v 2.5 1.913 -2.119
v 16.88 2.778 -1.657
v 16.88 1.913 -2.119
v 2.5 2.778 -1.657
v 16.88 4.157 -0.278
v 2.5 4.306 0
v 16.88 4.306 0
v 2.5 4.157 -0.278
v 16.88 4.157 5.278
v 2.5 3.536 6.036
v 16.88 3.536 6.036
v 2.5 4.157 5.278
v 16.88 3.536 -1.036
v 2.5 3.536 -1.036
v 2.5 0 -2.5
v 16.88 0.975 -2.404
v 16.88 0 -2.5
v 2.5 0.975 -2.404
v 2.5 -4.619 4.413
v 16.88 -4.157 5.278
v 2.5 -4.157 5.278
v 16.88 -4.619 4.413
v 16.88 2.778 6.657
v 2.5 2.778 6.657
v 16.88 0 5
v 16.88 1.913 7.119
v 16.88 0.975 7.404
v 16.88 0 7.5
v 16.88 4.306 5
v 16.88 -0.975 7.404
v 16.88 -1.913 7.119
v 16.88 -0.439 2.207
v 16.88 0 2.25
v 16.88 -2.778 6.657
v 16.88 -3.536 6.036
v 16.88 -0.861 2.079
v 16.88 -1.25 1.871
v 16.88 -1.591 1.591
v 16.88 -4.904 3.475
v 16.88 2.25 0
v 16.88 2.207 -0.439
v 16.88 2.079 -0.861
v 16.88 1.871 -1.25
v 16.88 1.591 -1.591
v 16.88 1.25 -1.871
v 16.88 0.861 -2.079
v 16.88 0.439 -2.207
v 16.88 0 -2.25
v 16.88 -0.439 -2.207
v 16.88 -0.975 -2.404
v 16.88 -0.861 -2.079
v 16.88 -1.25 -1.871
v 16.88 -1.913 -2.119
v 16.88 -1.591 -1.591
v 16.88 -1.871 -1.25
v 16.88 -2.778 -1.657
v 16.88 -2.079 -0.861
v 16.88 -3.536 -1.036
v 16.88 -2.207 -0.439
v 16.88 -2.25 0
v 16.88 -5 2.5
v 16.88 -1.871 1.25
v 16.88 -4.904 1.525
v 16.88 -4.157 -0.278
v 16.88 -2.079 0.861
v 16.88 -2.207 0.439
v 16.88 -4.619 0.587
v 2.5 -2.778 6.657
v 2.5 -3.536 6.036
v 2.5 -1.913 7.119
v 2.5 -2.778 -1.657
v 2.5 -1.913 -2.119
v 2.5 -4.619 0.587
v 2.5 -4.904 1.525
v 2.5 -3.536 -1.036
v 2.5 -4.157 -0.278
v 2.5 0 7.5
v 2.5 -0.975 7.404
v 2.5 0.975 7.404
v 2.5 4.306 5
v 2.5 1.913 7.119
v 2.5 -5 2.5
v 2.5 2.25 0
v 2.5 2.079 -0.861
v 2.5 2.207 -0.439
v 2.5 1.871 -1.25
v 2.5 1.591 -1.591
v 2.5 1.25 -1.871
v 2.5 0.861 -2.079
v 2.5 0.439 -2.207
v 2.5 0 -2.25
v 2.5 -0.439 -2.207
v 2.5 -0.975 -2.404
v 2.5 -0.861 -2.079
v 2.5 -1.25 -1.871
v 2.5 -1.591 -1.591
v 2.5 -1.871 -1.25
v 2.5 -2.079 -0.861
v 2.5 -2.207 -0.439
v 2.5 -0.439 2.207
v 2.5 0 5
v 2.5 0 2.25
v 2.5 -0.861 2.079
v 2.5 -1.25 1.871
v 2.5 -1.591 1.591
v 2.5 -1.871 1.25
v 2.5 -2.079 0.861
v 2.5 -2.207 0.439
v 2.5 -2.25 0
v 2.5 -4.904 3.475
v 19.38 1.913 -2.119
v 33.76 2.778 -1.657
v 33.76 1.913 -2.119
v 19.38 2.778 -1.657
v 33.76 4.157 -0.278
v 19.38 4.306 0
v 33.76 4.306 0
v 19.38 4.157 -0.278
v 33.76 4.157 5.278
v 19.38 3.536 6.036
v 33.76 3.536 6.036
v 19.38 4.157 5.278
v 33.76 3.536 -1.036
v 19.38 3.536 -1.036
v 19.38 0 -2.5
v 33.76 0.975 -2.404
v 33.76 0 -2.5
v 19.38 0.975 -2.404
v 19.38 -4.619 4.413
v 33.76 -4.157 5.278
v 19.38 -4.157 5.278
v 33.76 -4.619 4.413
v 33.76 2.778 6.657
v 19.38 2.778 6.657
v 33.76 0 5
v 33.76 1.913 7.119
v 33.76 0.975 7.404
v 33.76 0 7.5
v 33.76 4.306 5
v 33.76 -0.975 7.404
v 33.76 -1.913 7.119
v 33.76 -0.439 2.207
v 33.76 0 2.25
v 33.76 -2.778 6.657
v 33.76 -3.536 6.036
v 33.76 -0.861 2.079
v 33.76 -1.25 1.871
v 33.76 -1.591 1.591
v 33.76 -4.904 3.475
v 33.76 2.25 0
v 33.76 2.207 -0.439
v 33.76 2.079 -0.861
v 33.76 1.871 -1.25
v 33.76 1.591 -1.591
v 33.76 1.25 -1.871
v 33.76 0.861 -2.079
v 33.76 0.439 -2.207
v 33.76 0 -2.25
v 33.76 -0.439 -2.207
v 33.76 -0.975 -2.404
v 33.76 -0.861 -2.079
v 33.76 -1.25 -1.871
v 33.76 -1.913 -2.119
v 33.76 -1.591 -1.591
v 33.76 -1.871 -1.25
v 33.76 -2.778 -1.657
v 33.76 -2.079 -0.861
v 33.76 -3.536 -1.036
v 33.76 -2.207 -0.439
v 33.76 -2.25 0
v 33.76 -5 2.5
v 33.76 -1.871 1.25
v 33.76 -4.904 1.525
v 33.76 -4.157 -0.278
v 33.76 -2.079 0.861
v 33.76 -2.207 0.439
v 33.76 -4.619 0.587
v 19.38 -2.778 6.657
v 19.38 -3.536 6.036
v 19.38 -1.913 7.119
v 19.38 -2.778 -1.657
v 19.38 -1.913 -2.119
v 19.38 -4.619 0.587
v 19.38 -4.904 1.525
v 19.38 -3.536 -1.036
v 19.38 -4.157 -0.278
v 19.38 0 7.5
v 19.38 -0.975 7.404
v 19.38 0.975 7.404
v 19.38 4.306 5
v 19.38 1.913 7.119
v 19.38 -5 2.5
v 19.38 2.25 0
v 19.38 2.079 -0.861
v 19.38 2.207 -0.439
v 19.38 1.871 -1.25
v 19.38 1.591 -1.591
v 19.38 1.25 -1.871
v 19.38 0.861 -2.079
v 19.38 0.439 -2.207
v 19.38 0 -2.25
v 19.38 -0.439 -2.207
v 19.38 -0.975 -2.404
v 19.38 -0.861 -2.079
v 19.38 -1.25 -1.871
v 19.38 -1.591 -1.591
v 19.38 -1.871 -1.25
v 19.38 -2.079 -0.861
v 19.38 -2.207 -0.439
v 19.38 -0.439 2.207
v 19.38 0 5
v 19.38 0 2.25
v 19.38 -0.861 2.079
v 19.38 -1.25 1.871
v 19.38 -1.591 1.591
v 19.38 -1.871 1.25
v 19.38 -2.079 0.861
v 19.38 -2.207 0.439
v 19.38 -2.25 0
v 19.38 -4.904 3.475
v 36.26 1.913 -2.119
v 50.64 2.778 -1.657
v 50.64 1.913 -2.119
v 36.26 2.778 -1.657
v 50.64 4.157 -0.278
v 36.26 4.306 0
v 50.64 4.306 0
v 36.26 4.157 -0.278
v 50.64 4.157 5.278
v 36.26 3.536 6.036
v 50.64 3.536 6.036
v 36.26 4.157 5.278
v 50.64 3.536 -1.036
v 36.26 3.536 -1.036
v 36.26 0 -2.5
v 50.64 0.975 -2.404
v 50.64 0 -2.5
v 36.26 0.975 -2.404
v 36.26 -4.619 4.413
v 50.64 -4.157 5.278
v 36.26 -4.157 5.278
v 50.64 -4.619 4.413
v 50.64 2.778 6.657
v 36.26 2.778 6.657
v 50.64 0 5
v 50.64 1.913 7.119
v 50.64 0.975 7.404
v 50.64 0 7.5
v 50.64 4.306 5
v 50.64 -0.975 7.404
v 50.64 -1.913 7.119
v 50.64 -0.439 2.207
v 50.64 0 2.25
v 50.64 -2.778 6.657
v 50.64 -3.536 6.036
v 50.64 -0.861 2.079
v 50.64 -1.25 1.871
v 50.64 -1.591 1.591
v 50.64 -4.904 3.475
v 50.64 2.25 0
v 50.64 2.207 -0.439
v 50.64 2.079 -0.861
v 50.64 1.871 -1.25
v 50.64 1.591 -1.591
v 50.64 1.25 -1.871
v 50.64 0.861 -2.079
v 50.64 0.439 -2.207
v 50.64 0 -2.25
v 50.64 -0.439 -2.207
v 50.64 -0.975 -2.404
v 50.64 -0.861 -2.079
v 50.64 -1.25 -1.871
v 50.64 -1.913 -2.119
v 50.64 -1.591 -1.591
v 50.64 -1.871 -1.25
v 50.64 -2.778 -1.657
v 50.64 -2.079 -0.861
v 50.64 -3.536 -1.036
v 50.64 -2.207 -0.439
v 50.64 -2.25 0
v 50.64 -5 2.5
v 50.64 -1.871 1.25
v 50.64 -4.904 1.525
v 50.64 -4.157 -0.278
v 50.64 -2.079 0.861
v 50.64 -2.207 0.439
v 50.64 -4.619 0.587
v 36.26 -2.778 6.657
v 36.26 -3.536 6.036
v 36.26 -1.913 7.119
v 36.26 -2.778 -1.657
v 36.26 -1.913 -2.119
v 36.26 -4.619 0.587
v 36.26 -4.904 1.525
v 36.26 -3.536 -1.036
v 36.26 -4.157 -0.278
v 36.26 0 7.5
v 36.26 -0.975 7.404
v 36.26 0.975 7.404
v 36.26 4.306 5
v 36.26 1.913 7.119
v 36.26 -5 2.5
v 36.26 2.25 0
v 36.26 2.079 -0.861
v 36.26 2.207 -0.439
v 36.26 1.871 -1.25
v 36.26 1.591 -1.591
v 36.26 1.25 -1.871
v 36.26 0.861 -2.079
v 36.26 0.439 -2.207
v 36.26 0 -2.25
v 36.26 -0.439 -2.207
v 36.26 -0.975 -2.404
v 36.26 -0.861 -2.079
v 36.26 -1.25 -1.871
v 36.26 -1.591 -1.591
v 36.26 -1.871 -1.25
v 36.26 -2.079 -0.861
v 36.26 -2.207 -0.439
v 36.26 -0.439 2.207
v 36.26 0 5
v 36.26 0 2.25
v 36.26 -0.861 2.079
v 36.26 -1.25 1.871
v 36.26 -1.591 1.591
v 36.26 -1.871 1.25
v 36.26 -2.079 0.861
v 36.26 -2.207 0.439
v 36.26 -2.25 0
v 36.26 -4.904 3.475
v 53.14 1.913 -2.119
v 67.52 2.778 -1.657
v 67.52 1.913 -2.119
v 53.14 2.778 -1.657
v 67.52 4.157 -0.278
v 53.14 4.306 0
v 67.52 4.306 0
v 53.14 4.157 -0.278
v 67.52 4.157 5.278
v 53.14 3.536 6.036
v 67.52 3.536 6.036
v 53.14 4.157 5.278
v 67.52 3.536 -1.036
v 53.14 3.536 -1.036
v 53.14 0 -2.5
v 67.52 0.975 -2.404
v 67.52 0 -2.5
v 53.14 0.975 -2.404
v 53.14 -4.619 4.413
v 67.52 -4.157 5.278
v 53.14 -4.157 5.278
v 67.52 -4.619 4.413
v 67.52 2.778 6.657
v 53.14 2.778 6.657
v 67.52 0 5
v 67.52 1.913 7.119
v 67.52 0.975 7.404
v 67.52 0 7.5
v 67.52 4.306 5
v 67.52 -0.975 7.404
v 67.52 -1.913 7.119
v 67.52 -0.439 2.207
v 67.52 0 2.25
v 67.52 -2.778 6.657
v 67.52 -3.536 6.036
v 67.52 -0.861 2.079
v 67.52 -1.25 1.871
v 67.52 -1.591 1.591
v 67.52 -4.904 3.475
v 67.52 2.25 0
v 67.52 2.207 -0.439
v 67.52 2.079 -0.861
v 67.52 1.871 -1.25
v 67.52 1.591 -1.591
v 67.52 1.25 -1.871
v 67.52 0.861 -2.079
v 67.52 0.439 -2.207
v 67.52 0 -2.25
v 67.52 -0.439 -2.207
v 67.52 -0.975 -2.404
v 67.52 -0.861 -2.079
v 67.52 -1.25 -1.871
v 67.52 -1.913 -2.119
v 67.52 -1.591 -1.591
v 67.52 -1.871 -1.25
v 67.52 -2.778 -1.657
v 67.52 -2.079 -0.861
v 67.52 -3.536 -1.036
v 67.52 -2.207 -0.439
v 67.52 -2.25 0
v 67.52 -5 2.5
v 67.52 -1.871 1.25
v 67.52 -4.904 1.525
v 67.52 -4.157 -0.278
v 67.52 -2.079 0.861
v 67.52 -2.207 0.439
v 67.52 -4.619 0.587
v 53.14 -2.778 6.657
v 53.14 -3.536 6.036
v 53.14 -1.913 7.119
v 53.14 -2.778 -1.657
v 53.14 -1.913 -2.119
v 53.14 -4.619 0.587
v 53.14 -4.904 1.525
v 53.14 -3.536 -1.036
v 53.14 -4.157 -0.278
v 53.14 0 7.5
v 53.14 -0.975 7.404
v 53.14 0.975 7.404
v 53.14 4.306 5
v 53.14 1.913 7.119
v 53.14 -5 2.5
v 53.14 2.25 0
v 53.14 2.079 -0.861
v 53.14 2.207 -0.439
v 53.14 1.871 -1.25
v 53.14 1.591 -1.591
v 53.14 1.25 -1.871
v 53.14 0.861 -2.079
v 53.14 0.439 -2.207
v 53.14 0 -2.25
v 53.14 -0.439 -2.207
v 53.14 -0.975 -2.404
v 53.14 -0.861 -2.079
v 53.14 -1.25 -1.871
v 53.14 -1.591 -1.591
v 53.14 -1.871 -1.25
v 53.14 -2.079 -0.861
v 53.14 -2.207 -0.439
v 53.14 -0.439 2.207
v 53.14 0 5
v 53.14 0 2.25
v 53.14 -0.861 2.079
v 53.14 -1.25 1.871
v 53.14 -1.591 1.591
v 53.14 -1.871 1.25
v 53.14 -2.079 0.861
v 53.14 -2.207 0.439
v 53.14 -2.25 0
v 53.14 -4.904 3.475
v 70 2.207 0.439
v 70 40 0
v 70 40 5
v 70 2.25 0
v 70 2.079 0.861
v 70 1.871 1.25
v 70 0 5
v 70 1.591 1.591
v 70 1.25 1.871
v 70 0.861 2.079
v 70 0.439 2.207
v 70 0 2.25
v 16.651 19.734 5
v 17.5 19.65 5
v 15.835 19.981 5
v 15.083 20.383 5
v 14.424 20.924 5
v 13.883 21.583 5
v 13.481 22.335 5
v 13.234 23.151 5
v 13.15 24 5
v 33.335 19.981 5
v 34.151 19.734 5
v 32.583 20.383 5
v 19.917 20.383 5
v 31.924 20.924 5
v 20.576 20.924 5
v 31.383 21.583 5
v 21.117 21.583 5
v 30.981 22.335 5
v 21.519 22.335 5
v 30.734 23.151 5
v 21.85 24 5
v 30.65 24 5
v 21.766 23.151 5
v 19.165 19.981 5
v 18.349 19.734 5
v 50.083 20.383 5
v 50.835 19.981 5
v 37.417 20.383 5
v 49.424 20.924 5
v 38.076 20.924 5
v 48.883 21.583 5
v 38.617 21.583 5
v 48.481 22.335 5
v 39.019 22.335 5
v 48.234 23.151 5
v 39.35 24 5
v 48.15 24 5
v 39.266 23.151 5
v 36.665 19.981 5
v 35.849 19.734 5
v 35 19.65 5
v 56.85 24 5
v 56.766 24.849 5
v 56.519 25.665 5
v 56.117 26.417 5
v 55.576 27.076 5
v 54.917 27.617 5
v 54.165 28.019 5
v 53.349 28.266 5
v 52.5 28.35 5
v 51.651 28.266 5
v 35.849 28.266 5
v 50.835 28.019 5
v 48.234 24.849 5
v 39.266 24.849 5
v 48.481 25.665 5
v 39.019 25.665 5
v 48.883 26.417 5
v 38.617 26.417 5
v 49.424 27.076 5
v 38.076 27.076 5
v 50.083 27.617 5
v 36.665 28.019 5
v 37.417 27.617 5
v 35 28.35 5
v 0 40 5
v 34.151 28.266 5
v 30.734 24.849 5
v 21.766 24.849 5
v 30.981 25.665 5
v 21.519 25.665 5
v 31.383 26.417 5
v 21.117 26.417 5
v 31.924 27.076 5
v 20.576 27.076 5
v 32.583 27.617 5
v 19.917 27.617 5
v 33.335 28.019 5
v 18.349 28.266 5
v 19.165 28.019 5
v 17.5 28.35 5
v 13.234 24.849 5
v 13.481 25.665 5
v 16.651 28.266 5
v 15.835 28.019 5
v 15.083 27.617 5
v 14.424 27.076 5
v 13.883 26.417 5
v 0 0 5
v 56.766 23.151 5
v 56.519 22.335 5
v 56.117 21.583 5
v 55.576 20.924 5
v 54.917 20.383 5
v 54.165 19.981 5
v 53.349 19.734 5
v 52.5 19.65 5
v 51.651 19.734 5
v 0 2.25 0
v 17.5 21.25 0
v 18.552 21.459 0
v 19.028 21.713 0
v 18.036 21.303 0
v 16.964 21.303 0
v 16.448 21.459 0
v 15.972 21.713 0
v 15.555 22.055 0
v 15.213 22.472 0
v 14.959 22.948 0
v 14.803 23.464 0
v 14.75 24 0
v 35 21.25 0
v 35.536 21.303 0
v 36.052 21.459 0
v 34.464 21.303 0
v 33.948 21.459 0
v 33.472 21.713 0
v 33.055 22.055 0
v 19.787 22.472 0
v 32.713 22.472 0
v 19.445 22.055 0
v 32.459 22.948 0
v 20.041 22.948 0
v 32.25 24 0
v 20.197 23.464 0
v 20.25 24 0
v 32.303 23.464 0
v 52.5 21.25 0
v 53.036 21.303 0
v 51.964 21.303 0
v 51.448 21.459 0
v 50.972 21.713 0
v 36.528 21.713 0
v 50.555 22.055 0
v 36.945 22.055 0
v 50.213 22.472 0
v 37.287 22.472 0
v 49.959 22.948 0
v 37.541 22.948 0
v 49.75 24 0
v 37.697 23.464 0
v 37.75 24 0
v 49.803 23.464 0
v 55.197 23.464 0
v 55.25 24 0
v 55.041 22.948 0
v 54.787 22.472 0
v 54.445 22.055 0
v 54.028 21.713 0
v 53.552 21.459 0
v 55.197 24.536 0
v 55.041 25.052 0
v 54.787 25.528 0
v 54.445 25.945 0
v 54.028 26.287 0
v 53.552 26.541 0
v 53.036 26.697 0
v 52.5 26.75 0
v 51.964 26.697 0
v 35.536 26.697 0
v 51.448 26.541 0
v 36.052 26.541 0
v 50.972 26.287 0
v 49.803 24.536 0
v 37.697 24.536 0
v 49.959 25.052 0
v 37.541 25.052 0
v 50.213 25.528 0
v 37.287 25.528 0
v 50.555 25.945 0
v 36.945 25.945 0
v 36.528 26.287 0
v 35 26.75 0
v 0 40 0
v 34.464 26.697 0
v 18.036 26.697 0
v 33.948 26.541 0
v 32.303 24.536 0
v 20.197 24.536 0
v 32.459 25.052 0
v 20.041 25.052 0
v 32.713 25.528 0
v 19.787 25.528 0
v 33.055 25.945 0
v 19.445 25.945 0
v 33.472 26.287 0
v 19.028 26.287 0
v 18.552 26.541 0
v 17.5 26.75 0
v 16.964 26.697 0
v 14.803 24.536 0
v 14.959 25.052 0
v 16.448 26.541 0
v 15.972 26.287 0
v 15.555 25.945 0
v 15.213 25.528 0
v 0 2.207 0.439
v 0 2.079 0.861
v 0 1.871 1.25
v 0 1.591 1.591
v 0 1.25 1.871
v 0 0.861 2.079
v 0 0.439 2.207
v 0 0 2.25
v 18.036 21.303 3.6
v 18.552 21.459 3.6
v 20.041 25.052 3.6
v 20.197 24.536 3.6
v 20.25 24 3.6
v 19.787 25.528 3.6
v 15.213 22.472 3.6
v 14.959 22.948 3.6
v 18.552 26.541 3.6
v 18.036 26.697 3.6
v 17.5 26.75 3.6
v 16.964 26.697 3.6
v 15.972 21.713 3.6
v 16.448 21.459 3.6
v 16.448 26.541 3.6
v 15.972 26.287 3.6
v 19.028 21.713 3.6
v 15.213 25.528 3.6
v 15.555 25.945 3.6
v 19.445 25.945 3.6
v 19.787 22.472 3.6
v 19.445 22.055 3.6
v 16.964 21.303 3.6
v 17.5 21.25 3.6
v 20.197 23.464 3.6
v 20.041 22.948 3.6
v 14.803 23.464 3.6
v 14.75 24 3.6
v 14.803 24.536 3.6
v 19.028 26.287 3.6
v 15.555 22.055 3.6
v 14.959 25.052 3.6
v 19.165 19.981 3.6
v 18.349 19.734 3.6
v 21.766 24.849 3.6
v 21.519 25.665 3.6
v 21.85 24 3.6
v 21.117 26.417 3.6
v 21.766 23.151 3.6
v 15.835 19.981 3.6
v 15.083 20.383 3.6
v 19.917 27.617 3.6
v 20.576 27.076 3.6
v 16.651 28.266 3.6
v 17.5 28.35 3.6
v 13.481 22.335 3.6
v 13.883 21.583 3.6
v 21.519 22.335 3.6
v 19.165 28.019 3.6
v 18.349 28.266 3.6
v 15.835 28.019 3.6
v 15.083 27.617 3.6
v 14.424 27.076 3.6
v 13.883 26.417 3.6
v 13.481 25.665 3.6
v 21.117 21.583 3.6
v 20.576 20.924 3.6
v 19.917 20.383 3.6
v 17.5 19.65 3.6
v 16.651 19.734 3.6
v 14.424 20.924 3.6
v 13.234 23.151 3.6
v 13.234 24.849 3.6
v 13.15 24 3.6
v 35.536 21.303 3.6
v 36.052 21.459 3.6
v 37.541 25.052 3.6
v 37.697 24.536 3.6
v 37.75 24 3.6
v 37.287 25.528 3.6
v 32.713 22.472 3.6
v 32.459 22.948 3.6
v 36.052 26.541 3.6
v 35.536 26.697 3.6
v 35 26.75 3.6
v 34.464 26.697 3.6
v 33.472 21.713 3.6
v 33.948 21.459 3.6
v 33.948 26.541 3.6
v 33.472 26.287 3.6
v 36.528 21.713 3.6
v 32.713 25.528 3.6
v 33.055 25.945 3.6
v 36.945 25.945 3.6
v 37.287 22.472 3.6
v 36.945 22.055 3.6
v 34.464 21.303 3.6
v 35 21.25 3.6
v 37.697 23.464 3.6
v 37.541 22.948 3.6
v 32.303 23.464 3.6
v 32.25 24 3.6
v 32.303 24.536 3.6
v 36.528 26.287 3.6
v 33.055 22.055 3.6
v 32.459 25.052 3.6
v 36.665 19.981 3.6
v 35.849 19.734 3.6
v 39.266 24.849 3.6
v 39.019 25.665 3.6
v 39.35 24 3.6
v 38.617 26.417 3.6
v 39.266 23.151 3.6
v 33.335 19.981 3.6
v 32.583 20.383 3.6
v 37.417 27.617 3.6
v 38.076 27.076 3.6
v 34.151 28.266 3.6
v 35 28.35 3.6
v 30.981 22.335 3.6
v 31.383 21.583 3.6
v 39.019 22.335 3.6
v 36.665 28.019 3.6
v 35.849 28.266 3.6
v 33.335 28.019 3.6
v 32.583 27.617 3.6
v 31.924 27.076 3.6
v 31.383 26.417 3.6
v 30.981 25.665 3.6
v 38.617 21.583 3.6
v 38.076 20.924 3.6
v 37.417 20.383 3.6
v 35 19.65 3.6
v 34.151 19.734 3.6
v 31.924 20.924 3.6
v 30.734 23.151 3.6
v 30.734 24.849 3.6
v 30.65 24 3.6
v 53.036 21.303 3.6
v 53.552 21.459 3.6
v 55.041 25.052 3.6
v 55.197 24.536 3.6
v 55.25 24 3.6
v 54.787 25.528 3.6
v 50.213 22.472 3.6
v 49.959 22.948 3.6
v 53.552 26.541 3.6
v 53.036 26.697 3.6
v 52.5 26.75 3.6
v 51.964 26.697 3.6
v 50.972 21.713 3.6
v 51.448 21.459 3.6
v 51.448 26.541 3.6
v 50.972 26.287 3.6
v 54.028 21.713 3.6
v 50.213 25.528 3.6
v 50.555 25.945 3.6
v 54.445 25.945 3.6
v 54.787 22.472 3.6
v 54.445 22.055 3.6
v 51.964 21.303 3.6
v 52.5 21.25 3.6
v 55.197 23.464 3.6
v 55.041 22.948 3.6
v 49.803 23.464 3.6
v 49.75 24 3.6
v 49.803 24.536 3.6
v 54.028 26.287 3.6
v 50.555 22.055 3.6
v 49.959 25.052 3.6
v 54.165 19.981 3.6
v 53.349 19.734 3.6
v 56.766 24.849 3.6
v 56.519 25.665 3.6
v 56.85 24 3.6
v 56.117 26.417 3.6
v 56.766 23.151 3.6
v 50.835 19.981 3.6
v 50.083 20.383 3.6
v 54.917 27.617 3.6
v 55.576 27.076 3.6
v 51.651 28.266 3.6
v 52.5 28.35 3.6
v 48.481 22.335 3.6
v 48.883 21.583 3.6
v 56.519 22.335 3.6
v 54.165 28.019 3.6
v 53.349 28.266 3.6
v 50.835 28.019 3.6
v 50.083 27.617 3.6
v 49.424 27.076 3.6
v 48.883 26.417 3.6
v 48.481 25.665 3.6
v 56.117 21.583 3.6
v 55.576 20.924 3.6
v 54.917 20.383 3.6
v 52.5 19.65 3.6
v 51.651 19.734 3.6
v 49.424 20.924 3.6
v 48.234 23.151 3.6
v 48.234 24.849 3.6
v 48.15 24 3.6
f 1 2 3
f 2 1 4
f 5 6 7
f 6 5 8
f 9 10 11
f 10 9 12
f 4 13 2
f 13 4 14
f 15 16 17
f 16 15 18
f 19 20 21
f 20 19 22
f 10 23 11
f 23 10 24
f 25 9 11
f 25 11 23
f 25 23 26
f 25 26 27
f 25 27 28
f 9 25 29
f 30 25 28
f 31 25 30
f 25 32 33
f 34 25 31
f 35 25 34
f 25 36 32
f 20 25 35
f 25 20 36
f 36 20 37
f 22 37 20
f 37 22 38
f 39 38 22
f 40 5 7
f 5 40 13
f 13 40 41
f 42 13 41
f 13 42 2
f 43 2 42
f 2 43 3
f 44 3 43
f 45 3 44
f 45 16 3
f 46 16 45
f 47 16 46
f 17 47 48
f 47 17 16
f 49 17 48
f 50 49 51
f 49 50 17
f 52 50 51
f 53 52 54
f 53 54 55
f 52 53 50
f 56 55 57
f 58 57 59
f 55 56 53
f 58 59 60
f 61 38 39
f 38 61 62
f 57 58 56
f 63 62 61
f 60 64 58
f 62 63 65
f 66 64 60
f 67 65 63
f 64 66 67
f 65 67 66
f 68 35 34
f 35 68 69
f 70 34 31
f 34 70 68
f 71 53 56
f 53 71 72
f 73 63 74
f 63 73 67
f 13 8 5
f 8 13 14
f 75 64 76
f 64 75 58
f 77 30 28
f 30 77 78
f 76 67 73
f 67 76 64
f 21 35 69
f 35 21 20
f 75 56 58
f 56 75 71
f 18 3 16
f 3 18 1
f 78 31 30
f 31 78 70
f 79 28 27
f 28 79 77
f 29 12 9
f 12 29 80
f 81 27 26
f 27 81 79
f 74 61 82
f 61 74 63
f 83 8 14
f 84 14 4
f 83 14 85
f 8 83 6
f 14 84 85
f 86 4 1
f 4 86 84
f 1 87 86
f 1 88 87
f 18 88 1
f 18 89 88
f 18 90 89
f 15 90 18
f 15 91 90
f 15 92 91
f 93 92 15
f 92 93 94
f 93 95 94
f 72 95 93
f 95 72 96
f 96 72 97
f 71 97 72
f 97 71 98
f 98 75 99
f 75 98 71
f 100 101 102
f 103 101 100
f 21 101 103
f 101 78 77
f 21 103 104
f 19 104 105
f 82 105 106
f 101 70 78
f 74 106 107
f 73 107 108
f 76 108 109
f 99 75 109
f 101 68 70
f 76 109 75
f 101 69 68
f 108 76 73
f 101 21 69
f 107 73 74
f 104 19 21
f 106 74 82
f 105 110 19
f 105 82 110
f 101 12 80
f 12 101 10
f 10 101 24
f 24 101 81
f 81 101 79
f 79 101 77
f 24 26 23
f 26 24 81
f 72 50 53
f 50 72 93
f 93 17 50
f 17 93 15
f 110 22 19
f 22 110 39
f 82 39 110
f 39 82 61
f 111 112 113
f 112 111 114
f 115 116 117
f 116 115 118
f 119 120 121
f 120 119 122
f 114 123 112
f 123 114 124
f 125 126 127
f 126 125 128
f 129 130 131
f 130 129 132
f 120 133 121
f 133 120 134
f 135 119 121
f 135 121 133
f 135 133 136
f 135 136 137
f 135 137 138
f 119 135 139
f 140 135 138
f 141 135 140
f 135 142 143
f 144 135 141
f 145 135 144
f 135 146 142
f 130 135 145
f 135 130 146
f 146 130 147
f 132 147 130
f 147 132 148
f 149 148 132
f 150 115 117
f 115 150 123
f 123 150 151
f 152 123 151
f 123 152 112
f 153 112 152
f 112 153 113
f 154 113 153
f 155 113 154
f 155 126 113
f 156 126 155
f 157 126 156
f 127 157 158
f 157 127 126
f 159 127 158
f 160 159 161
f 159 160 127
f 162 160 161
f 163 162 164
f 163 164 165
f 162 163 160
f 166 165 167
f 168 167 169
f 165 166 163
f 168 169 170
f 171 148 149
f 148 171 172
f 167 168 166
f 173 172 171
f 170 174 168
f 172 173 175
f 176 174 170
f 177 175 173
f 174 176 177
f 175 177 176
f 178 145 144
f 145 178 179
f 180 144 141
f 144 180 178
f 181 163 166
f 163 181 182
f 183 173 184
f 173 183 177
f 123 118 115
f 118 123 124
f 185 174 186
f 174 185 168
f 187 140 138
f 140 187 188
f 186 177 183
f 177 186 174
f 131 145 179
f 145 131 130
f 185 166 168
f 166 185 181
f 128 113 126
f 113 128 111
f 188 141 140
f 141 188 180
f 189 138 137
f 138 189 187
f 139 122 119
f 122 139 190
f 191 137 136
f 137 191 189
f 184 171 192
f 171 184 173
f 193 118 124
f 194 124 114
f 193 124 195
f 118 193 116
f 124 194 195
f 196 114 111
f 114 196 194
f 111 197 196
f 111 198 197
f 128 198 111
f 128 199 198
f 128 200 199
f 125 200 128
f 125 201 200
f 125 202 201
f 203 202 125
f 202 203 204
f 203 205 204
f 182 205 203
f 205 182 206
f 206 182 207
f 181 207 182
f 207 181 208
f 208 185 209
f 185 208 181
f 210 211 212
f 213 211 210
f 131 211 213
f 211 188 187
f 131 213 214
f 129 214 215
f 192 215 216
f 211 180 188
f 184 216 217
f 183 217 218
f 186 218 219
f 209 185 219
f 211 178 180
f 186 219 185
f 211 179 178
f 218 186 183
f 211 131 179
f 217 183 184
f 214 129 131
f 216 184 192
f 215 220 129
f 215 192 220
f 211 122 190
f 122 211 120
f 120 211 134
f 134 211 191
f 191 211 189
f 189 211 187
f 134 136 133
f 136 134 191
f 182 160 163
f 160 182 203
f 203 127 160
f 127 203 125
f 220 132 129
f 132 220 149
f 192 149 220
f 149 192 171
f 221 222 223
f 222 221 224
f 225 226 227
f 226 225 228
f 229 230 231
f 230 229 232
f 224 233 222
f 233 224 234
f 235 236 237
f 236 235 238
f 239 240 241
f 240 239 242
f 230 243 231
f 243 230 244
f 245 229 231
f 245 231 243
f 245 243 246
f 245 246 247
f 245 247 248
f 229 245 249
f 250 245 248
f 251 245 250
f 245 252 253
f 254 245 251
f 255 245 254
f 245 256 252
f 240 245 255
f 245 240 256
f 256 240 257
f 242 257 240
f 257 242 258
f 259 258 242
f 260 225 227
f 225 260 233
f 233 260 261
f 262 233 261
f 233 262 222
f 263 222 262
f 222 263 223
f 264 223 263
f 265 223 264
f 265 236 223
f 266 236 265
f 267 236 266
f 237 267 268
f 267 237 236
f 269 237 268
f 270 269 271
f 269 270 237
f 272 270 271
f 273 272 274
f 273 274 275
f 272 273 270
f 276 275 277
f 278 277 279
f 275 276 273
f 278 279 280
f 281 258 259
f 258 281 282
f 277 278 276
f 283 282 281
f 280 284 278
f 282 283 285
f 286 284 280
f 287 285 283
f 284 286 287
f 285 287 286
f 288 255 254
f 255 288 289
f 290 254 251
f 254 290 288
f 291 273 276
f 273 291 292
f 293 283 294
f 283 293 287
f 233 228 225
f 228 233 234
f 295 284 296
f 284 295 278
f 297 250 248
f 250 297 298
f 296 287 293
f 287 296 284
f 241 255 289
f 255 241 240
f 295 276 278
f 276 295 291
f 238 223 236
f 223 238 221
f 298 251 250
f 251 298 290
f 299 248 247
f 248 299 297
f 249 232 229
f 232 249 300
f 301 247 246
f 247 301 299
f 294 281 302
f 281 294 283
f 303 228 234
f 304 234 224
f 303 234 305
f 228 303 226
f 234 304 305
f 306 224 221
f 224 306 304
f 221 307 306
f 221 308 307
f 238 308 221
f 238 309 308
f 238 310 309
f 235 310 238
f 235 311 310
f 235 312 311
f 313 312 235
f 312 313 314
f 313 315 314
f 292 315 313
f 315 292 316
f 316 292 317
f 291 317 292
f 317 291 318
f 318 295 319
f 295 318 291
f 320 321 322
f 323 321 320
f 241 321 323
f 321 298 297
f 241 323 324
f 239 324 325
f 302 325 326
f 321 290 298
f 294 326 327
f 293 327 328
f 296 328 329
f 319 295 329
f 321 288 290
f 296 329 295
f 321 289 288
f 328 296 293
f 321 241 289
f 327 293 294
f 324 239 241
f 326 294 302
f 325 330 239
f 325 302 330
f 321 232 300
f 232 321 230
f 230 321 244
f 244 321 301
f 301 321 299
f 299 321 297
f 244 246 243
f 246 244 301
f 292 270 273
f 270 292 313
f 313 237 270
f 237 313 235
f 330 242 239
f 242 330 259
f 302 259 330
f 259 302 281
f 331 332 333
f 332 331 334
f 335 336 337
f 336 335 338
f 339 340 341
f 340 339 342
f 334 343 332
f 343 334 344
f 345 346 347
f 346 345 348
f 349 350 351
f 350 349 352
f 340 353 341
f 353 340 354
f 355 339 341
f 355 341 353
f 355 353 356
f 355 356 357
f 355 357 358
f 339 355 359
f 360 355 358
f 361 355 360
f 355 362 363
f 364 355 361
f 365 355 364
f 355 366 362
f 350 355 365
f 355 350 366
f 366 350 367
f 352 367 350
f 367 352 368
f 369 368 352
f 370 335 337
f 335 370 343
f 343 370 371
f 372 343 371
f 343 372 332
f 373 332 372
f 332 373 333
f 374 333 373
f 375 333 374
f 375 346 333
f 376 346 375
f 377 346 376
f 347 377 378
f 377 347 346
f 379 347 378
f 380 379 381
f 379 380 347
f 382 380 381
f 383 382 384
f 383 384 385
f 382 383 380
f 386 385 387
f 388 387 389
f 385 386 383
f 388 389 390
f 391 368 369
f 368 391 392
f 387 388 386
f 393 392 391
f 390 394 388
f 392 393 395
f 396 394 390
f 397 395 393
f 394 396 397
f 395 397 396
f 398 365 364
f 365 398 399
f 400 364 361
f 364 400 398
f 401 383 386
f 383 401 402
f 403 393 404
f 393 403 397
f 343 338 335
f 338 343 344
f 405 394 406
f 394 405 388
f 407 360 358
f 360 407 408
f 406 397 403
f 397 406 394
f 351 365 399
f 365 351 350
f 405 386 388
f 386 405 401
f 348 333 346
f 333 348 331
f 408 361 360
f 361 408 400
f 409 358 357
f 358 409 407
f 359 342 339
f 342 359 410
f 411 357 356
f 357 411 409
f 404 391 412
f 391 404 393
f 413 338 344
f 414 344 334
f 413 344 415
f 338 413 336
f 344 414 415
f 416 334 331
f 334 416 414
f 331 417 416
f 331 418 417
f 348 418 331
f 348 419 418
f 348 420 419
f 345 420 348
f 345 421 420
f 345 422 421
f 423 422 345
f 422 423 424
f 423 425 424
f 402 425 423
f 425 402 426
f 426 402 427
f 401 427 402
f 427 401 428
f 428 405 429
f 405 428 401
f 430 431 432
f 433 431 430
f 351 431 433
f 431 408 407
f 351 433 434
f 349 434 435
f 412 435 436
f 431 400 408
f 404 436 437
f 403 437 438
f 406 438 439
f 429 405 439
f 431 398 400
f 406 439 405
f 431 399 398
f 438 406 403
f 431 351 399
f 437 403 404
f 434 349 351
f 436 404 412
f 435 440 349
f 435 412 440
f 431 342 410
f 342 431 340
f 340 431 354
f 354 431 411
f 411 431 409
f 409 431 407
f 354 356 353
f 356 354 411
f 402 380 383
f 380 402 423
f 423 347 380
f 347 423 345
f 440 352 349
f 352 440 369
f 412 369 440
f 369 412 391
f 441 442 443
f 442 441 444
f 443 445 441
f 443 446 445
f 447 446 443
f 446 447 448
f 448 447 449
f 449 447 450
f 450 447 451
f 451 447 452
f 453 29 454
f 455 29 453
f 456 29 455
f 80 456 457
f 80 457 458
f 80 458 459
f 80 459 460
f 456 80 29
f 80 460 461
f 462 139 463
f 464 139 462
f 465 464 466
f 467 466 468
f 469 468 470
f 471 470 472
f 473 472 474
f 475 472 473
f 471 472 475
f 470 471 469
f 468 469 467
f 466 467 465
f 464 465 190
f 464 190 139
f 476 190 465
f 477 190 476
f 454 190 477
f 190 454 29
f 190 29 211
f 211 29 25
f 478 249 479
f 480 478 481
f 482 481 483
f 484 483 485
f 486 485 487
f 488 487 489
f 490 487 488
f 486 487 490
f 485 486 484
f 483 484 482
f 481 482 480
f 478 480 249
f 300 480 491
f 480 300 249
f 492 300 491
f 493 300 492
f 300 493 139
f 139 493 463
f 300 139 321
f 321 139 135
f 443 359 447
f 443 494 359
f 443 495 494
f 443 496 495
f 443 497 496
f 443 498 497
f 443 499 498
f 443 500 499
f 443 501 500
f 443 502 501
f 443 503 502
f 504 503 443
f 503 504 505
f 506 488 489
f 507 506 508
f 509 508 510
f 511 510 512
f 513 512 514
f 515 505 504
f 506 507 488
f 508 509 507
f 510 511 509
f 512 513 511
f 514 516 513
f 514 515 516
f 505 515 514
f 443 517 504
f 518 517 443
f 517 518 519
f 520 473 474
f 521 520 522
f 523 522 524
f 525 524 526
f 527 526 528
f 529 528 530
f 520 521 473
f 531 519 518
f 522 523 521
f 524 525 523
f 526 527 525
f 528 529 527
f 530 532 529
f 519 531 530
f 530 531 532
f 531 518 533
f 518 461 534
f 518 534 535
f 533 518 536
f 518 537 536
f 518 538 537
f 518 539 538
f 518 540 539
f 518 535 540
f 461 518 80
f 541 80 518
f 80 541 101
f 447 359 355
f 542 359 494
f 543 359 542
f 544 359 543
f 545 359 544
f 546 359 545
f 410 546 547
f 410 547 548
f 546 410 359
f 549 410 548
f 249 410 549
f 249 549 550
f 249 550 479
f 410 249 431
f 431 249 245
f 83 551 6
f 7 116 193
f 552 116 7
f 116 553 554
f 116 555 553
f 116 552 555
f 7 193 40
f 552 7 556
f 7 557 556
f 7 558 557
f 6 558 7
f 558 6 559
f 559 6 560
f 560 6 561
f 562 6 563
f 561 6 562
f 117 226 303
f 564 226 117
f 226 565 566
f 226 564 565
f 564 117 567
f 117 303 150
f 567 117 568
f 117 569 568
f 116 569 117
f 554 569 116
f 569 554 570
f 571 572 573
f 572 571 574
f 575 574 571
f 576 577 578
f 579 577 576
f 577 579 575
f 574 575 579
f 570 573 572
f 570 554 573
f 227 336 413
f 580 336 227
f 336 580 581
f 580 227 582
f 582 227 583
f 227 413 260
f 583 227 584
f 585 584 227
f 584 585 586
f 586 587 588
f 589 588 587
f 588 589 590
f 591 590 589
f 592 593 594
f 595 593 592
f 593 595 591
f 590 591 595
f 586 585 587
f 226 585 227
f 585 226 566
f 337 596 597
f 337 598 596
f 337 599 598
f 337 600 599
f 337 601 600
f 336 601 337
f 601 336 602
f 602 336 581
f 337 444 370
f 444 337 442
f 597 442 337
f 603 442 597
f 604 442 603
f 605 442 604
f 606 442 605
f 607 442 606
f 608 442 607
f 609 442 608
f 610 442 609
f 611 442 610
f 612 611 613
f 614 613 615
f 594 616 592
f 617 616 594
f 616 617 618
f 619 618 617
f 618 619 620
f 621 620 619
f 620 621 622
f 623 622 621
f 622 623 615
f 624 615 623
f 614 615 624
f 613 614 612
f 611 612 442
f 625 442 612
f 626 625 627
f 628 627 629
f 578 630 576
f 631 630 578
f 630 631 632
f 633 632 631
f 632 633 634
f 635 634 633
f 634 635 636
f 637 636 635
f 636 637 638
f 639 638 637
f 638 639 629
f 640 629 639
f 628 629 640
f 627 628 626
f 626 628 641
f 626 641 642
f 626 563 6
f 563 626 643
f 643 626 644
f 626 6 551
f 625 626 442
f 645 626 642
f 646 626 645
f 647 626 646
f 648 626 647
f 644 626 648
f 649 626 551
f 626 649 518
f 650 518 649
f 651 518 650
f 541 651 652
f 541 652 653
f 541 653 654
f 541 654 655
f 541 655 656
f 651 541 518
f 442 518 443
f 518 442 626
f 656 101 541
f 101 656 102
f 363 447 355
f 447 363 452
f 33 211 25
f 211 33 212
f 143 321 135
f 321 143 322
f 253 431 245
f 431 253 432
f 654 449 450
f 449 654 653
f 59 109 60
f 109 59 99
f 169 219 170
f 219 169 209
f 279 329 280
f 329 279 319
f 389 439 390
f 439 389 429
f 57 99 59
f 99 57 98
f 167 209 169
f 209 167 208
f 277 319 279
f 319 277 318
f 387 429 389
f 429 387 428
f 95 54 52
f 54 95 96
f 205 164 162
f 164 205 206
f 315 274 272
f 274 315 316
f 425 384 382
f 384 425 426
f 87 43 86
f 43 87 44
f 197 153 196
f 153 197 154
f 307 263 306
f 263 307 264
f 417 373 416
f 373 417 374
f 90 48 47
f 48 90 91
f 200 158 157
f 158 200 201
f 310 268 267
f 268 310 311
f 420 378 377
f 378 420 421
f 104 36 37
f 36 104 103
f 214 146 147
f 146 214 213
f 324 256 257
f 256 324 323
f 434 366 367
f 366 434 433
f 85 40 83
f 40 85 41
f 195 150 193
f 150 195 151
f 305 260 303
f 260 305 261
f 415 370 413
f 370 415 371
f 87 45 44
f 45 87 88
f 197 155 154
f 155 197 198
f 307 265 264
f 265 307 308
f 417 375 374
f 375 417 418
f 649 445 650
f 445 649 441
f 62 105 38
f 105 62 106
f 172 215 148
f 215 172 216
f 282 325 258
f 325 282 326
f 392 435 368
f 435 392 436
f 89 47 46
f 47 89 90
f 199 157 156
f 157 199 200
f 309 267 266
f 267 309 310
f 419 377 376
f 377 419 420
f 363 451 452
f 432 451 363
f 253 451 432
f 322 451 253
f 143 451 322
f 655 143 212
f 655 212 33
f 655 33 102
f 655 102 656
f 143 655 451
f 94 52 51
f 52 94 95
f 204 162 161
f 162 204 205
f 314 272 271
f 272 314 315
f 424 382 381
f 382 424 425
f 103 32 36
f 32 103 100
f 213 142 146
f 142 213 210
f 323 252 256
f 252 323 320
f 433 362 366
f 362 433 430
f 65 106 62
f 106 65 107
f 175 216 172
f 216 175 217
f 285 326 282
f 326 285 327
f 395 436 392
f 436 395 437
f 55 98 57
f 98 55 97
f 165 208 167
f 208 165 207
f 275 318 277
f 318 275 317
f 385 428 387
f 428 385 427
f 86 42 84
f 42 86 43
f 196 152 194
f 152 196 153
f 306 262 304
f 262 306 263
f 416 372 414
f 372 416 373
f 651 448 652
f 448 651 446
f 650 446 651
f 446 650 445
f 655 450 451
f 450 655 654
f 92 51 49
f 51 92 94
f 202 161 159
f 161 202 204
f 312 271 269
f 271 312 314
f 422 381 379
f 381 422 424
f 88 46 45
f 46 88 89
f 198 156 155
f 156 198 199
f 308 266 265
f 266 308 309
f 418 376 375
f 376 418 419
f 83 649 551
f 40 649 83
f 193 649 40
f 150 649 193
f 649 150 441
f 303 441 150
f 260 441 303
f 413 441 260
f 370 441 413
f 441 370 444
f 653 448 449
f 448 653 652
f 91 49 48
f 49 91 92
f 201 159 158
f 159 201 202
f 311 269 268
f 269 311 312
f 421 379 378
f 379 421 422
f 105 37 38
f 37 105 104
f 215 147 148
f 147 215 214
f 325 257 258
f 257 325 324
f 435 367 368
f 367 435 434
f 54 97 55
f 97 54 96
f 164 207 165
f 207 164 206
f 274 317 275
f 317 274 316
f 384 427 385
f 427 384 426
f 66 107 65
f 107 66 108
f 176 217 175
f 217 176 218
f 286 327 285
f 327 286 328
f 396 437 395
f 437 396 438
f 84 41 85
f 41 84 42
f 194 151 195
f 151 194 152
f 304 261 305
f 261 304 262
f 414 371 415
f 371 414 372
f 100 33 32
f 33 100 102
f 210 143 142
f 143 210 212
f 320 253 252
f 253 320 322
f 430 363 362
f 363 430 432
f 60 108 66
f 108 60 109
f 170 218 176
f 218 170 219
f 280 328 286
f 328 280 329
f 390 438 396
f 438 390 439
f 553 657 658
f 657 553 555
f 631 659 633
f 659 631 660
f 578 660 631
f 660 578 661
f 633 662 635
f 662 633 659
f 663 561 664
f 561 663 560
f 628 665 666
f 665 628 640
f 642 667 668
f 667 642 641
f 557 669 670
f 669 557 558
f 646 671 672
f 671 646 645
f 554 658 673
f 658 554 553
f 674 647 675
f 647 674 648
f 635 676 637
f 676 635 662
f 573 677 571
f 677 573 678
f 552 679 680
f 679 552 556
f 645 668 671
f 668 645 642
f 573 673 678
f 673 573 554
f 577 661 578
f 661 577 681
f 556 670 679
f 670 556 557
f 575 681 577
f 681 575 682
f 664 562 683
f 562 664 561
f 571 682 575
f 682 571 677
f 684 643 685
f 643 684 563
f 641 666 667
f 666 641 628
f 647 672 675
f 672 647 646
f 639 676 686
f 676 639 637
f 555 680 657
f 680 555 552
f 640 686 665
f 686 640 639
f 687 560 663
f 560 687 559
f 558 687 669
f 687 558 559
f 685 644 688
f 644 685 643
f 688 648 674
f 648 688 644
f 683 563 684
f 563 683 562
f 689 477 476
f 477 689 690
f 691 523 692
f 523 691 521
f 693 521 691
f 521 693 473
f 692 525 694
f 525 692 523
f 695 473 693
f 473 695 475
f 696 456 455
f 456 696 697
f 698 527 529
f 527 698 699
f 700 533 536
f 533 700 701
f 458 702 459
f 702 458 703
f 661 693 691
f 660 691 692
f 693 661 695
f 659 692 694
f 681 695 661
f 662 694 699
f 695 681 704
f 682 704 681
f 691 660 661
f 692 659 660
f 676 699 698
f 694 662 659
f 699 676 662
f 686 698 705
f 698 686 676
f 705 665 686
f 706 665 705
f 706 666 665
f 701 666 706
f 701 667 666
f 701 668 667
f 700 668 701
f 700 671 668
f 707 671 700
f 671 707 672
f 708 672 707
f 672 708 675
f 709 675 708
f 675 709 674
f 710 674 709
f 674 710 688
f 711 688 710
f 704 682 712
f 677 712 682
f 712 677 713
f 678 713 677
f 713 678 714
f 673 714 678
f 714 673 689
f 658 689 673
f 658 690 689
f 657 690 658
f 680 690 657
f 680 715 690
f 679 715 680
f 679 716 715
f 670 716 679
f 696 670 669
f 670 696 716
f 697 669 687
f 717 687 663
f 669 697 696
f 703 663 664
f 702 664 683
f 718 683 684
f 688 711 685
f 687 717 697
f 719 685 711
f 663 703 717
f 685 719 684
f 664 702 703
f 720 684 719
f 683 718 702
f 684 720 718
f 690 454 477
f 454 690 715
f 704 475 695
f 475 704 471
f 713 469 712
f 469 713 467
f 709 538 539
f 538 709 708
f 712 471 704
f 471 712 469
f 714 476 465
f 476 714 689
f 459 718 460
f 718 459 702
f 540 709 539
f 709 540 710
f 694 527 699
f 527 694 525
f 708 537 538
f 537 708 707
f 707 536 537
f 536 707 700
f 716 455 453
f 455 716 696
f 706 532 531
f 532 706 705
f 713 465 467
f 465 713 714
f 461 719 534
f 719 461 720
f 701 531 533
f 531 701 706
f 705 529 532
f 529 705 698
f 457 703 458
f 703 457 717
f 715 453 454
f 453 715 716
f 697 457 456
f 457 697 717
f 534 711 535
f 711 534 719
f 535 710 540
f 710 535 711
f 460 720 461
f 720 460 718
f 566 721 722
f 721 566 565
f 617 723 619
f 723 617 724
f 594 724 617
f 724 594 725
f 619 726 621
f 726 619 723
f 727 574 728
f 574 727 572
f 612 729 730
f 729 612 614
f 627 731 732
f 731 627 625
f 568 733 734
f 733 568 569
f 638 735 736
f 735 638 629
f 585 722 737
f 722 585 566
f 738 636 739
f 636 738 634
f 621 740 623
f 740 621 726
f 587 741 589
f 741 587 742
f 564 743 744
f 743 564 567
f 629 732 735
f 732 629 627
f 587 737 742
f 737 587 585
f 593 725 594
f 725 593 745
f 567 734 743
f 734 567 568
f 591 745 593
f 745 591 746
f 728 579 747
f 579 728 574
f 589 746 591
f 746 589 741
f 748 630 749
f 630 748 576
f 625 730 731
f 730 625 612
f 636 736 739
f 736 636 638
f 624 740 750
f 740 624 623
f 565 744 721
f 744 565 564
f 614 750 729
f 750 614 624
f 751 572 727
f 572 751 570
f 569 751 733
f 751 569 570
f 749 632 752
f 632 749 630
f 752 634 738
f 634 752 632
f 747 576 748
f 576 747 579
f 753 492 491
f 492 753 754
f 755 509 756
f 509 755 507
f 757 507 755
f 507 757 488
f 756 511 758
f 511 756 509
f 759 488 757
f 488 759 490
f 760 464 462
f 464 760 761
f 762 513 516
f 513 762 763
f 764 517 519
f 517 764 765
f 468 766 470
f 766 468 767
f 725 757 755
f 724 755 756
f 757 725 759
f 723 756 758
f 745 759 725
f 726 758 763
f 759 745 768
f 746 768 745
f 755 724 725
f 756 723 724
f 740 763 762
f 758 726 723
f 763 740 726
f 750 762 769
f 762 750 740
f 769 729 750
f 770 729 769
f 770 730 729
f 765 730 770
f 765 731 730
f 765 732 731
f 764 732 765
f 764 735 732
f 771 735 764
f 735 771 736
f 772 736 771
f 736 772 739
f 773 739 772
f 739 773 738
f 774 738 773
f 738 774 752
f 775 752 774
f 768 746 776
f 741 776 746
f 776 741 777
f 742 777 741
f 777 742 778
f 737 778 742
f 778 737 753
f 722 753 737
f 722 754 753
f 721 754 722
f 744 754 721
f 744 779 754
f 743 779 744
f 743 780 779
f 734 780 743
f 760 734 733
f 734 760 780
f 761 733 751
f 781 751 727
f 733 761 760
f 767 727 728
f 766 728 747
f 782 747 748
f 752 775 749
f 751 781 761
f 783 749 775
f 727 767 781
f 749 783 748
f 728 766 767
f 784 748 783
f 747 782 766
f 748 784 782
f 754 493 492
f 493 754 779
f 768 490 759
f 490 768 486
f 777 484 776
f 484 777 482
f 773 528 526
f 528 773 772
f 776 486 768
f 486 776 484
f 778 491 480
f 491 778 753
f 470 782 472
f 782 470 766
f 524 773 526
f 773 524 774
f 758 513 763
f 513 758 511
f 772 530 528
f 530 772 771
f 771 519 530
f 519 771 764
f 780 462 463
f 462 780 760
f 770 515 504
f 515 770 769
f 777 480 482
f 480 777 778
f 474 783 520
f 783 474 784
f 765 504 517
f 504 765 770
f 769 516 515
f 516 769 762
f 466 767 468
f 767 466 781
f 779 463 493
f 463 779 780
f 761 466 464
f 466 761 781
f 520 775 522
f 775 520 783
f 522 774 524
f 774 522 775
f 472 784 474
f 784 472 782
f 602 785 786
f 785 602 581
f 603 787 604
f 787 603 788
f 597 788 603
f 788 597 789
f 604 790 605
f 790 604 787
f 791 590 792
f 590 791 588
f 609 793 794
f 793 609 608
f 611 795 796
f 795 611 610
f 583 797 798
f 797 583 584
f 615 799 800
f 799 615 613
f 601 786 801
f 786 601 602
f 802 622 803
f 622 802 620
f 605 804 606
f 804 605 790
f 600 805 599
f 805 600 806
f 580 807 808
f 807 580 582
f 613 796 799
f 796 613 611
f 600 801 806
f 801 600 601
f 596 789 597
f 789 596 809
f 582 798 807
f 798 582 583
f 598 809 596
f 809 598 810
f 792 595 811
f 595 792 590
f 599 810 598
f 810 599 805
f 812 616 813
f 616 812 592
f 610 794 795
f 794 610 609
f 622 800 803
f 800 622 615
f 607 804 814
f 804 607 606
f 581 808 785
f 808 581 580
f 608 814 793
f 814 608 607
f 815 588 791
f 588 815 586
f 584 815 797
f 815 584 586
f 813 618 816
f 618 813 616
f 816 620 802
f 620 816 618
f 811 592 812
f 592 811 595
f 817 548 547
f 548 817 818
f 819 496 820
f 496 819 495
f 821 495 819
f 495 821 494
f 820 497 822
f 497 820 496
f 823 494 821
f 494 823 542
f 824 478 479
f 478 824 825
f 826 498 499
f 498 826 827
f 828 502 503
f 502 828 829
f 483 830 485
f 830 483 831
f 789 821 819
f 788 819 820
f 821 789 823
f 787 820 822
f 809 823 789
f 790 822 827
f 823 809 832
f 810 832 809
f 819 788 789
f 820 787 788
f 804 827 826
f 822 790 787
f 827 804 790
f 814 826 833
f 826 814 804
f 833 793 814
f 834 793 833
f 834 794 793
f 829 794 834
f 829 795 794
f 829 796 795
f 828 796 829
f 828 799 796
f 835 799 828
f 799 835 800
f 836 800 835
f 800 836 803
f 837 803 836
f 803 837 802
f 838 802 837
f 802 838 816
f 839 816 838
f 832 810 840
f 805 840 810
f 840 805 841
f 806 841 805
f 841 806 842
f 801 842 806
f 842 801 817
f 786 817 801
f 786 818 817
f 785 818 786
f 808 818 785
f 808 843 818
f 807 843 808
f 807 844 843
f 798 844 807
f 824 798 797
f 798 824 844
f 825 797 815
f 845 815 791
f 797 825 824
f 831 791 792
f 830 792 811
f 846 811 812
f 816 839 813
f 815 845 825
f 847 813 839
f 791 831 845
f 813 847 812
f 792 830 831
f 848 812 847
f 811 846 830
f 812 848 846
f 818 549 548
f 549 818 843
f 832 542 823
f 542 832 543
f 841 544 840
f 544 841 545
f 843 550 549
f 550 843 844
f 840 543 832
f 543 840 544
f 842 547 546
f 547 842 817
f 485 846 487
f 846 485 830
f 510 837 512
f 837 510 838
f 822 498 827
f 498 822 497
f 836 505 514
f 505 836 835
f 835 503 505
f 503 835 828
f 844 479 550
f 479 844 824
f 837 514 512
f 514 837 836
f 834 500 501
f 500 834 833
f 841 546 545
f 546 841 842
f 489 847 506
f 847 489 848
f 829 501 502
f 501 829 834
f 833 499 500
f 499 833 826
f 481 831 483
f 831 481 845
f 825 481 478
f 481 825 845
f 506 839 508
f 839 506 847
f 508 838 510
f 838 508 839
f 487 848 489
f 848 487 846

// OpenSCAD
$fn = 32;

// ----------------------------------------------------------------------
// Hinge leaf: 70 x 45 x 10 mm
// ----------------------------------------------------------------------

// --- parameters (mm) ---
tab_len = 70;             // leaf length, X
tab_w = 40;               // leaf width, Y
tab_t = 5;                // leaf thickness
ring_d = 10;              // knuckle diameter
ring_w = 14.38;           // knuckle width
knuckle_n = 4;            // number of knuckles
pin_d = 4.5;              // pin bore
gap = 2.5;                // gap between the knuckles
screw_d = 5.5;            // screw clearance
cs_d = 8.7;               // countersink diameter
cs_h = 1.4;               // countersink depth

module leaf() {
  cube([tab_len, tab_w, tab_t]);
}

module knuckles() {
  /* barrels sit on the leaf edge, the pin axis at half the leaf thickness */
  for (i = [0 : knuckle_n - 1])
    translate([gap + i * (ring_w + gap), 0, tab_t * 0.5])
      rotate([0, 90, 0]) cylinder(h = ring_w, d = ring_d);
}

difference() {
  union() {
    leaf();
    knuckles();
  }
  rotate([0, 90, 0]) translate([0, 0, -1])
    cylinder(h = tab_len + 2, d = pin_d);
  translate([17.5, tab_w * 0.6, -1]) cylinder(h = tab_t + 2, d = screw_d);
  translate([17.5, tab_w * 0.6, tab_t - cs_h]) cylinder(h = cs_h + 0.5, d = cs_d);
  translate([35, tab_w * 0.6, -1]) cylinder(h = tab_t + 2, d = screw_d);
  translate([35, tab_w * 0.6, tab_t - cs_h]) cylinder(h = cs_h + 0.5, d = cs_d);
  translate([52.5, tab_w * 0.6, -1]) cylinder(h = tab_t + 2, d = screw_d);
  translate([52.5, tab_w * 0.6, tab_t - cs_h]) cylinder(h = cs_h + 0.5, d = cs_d);
}
